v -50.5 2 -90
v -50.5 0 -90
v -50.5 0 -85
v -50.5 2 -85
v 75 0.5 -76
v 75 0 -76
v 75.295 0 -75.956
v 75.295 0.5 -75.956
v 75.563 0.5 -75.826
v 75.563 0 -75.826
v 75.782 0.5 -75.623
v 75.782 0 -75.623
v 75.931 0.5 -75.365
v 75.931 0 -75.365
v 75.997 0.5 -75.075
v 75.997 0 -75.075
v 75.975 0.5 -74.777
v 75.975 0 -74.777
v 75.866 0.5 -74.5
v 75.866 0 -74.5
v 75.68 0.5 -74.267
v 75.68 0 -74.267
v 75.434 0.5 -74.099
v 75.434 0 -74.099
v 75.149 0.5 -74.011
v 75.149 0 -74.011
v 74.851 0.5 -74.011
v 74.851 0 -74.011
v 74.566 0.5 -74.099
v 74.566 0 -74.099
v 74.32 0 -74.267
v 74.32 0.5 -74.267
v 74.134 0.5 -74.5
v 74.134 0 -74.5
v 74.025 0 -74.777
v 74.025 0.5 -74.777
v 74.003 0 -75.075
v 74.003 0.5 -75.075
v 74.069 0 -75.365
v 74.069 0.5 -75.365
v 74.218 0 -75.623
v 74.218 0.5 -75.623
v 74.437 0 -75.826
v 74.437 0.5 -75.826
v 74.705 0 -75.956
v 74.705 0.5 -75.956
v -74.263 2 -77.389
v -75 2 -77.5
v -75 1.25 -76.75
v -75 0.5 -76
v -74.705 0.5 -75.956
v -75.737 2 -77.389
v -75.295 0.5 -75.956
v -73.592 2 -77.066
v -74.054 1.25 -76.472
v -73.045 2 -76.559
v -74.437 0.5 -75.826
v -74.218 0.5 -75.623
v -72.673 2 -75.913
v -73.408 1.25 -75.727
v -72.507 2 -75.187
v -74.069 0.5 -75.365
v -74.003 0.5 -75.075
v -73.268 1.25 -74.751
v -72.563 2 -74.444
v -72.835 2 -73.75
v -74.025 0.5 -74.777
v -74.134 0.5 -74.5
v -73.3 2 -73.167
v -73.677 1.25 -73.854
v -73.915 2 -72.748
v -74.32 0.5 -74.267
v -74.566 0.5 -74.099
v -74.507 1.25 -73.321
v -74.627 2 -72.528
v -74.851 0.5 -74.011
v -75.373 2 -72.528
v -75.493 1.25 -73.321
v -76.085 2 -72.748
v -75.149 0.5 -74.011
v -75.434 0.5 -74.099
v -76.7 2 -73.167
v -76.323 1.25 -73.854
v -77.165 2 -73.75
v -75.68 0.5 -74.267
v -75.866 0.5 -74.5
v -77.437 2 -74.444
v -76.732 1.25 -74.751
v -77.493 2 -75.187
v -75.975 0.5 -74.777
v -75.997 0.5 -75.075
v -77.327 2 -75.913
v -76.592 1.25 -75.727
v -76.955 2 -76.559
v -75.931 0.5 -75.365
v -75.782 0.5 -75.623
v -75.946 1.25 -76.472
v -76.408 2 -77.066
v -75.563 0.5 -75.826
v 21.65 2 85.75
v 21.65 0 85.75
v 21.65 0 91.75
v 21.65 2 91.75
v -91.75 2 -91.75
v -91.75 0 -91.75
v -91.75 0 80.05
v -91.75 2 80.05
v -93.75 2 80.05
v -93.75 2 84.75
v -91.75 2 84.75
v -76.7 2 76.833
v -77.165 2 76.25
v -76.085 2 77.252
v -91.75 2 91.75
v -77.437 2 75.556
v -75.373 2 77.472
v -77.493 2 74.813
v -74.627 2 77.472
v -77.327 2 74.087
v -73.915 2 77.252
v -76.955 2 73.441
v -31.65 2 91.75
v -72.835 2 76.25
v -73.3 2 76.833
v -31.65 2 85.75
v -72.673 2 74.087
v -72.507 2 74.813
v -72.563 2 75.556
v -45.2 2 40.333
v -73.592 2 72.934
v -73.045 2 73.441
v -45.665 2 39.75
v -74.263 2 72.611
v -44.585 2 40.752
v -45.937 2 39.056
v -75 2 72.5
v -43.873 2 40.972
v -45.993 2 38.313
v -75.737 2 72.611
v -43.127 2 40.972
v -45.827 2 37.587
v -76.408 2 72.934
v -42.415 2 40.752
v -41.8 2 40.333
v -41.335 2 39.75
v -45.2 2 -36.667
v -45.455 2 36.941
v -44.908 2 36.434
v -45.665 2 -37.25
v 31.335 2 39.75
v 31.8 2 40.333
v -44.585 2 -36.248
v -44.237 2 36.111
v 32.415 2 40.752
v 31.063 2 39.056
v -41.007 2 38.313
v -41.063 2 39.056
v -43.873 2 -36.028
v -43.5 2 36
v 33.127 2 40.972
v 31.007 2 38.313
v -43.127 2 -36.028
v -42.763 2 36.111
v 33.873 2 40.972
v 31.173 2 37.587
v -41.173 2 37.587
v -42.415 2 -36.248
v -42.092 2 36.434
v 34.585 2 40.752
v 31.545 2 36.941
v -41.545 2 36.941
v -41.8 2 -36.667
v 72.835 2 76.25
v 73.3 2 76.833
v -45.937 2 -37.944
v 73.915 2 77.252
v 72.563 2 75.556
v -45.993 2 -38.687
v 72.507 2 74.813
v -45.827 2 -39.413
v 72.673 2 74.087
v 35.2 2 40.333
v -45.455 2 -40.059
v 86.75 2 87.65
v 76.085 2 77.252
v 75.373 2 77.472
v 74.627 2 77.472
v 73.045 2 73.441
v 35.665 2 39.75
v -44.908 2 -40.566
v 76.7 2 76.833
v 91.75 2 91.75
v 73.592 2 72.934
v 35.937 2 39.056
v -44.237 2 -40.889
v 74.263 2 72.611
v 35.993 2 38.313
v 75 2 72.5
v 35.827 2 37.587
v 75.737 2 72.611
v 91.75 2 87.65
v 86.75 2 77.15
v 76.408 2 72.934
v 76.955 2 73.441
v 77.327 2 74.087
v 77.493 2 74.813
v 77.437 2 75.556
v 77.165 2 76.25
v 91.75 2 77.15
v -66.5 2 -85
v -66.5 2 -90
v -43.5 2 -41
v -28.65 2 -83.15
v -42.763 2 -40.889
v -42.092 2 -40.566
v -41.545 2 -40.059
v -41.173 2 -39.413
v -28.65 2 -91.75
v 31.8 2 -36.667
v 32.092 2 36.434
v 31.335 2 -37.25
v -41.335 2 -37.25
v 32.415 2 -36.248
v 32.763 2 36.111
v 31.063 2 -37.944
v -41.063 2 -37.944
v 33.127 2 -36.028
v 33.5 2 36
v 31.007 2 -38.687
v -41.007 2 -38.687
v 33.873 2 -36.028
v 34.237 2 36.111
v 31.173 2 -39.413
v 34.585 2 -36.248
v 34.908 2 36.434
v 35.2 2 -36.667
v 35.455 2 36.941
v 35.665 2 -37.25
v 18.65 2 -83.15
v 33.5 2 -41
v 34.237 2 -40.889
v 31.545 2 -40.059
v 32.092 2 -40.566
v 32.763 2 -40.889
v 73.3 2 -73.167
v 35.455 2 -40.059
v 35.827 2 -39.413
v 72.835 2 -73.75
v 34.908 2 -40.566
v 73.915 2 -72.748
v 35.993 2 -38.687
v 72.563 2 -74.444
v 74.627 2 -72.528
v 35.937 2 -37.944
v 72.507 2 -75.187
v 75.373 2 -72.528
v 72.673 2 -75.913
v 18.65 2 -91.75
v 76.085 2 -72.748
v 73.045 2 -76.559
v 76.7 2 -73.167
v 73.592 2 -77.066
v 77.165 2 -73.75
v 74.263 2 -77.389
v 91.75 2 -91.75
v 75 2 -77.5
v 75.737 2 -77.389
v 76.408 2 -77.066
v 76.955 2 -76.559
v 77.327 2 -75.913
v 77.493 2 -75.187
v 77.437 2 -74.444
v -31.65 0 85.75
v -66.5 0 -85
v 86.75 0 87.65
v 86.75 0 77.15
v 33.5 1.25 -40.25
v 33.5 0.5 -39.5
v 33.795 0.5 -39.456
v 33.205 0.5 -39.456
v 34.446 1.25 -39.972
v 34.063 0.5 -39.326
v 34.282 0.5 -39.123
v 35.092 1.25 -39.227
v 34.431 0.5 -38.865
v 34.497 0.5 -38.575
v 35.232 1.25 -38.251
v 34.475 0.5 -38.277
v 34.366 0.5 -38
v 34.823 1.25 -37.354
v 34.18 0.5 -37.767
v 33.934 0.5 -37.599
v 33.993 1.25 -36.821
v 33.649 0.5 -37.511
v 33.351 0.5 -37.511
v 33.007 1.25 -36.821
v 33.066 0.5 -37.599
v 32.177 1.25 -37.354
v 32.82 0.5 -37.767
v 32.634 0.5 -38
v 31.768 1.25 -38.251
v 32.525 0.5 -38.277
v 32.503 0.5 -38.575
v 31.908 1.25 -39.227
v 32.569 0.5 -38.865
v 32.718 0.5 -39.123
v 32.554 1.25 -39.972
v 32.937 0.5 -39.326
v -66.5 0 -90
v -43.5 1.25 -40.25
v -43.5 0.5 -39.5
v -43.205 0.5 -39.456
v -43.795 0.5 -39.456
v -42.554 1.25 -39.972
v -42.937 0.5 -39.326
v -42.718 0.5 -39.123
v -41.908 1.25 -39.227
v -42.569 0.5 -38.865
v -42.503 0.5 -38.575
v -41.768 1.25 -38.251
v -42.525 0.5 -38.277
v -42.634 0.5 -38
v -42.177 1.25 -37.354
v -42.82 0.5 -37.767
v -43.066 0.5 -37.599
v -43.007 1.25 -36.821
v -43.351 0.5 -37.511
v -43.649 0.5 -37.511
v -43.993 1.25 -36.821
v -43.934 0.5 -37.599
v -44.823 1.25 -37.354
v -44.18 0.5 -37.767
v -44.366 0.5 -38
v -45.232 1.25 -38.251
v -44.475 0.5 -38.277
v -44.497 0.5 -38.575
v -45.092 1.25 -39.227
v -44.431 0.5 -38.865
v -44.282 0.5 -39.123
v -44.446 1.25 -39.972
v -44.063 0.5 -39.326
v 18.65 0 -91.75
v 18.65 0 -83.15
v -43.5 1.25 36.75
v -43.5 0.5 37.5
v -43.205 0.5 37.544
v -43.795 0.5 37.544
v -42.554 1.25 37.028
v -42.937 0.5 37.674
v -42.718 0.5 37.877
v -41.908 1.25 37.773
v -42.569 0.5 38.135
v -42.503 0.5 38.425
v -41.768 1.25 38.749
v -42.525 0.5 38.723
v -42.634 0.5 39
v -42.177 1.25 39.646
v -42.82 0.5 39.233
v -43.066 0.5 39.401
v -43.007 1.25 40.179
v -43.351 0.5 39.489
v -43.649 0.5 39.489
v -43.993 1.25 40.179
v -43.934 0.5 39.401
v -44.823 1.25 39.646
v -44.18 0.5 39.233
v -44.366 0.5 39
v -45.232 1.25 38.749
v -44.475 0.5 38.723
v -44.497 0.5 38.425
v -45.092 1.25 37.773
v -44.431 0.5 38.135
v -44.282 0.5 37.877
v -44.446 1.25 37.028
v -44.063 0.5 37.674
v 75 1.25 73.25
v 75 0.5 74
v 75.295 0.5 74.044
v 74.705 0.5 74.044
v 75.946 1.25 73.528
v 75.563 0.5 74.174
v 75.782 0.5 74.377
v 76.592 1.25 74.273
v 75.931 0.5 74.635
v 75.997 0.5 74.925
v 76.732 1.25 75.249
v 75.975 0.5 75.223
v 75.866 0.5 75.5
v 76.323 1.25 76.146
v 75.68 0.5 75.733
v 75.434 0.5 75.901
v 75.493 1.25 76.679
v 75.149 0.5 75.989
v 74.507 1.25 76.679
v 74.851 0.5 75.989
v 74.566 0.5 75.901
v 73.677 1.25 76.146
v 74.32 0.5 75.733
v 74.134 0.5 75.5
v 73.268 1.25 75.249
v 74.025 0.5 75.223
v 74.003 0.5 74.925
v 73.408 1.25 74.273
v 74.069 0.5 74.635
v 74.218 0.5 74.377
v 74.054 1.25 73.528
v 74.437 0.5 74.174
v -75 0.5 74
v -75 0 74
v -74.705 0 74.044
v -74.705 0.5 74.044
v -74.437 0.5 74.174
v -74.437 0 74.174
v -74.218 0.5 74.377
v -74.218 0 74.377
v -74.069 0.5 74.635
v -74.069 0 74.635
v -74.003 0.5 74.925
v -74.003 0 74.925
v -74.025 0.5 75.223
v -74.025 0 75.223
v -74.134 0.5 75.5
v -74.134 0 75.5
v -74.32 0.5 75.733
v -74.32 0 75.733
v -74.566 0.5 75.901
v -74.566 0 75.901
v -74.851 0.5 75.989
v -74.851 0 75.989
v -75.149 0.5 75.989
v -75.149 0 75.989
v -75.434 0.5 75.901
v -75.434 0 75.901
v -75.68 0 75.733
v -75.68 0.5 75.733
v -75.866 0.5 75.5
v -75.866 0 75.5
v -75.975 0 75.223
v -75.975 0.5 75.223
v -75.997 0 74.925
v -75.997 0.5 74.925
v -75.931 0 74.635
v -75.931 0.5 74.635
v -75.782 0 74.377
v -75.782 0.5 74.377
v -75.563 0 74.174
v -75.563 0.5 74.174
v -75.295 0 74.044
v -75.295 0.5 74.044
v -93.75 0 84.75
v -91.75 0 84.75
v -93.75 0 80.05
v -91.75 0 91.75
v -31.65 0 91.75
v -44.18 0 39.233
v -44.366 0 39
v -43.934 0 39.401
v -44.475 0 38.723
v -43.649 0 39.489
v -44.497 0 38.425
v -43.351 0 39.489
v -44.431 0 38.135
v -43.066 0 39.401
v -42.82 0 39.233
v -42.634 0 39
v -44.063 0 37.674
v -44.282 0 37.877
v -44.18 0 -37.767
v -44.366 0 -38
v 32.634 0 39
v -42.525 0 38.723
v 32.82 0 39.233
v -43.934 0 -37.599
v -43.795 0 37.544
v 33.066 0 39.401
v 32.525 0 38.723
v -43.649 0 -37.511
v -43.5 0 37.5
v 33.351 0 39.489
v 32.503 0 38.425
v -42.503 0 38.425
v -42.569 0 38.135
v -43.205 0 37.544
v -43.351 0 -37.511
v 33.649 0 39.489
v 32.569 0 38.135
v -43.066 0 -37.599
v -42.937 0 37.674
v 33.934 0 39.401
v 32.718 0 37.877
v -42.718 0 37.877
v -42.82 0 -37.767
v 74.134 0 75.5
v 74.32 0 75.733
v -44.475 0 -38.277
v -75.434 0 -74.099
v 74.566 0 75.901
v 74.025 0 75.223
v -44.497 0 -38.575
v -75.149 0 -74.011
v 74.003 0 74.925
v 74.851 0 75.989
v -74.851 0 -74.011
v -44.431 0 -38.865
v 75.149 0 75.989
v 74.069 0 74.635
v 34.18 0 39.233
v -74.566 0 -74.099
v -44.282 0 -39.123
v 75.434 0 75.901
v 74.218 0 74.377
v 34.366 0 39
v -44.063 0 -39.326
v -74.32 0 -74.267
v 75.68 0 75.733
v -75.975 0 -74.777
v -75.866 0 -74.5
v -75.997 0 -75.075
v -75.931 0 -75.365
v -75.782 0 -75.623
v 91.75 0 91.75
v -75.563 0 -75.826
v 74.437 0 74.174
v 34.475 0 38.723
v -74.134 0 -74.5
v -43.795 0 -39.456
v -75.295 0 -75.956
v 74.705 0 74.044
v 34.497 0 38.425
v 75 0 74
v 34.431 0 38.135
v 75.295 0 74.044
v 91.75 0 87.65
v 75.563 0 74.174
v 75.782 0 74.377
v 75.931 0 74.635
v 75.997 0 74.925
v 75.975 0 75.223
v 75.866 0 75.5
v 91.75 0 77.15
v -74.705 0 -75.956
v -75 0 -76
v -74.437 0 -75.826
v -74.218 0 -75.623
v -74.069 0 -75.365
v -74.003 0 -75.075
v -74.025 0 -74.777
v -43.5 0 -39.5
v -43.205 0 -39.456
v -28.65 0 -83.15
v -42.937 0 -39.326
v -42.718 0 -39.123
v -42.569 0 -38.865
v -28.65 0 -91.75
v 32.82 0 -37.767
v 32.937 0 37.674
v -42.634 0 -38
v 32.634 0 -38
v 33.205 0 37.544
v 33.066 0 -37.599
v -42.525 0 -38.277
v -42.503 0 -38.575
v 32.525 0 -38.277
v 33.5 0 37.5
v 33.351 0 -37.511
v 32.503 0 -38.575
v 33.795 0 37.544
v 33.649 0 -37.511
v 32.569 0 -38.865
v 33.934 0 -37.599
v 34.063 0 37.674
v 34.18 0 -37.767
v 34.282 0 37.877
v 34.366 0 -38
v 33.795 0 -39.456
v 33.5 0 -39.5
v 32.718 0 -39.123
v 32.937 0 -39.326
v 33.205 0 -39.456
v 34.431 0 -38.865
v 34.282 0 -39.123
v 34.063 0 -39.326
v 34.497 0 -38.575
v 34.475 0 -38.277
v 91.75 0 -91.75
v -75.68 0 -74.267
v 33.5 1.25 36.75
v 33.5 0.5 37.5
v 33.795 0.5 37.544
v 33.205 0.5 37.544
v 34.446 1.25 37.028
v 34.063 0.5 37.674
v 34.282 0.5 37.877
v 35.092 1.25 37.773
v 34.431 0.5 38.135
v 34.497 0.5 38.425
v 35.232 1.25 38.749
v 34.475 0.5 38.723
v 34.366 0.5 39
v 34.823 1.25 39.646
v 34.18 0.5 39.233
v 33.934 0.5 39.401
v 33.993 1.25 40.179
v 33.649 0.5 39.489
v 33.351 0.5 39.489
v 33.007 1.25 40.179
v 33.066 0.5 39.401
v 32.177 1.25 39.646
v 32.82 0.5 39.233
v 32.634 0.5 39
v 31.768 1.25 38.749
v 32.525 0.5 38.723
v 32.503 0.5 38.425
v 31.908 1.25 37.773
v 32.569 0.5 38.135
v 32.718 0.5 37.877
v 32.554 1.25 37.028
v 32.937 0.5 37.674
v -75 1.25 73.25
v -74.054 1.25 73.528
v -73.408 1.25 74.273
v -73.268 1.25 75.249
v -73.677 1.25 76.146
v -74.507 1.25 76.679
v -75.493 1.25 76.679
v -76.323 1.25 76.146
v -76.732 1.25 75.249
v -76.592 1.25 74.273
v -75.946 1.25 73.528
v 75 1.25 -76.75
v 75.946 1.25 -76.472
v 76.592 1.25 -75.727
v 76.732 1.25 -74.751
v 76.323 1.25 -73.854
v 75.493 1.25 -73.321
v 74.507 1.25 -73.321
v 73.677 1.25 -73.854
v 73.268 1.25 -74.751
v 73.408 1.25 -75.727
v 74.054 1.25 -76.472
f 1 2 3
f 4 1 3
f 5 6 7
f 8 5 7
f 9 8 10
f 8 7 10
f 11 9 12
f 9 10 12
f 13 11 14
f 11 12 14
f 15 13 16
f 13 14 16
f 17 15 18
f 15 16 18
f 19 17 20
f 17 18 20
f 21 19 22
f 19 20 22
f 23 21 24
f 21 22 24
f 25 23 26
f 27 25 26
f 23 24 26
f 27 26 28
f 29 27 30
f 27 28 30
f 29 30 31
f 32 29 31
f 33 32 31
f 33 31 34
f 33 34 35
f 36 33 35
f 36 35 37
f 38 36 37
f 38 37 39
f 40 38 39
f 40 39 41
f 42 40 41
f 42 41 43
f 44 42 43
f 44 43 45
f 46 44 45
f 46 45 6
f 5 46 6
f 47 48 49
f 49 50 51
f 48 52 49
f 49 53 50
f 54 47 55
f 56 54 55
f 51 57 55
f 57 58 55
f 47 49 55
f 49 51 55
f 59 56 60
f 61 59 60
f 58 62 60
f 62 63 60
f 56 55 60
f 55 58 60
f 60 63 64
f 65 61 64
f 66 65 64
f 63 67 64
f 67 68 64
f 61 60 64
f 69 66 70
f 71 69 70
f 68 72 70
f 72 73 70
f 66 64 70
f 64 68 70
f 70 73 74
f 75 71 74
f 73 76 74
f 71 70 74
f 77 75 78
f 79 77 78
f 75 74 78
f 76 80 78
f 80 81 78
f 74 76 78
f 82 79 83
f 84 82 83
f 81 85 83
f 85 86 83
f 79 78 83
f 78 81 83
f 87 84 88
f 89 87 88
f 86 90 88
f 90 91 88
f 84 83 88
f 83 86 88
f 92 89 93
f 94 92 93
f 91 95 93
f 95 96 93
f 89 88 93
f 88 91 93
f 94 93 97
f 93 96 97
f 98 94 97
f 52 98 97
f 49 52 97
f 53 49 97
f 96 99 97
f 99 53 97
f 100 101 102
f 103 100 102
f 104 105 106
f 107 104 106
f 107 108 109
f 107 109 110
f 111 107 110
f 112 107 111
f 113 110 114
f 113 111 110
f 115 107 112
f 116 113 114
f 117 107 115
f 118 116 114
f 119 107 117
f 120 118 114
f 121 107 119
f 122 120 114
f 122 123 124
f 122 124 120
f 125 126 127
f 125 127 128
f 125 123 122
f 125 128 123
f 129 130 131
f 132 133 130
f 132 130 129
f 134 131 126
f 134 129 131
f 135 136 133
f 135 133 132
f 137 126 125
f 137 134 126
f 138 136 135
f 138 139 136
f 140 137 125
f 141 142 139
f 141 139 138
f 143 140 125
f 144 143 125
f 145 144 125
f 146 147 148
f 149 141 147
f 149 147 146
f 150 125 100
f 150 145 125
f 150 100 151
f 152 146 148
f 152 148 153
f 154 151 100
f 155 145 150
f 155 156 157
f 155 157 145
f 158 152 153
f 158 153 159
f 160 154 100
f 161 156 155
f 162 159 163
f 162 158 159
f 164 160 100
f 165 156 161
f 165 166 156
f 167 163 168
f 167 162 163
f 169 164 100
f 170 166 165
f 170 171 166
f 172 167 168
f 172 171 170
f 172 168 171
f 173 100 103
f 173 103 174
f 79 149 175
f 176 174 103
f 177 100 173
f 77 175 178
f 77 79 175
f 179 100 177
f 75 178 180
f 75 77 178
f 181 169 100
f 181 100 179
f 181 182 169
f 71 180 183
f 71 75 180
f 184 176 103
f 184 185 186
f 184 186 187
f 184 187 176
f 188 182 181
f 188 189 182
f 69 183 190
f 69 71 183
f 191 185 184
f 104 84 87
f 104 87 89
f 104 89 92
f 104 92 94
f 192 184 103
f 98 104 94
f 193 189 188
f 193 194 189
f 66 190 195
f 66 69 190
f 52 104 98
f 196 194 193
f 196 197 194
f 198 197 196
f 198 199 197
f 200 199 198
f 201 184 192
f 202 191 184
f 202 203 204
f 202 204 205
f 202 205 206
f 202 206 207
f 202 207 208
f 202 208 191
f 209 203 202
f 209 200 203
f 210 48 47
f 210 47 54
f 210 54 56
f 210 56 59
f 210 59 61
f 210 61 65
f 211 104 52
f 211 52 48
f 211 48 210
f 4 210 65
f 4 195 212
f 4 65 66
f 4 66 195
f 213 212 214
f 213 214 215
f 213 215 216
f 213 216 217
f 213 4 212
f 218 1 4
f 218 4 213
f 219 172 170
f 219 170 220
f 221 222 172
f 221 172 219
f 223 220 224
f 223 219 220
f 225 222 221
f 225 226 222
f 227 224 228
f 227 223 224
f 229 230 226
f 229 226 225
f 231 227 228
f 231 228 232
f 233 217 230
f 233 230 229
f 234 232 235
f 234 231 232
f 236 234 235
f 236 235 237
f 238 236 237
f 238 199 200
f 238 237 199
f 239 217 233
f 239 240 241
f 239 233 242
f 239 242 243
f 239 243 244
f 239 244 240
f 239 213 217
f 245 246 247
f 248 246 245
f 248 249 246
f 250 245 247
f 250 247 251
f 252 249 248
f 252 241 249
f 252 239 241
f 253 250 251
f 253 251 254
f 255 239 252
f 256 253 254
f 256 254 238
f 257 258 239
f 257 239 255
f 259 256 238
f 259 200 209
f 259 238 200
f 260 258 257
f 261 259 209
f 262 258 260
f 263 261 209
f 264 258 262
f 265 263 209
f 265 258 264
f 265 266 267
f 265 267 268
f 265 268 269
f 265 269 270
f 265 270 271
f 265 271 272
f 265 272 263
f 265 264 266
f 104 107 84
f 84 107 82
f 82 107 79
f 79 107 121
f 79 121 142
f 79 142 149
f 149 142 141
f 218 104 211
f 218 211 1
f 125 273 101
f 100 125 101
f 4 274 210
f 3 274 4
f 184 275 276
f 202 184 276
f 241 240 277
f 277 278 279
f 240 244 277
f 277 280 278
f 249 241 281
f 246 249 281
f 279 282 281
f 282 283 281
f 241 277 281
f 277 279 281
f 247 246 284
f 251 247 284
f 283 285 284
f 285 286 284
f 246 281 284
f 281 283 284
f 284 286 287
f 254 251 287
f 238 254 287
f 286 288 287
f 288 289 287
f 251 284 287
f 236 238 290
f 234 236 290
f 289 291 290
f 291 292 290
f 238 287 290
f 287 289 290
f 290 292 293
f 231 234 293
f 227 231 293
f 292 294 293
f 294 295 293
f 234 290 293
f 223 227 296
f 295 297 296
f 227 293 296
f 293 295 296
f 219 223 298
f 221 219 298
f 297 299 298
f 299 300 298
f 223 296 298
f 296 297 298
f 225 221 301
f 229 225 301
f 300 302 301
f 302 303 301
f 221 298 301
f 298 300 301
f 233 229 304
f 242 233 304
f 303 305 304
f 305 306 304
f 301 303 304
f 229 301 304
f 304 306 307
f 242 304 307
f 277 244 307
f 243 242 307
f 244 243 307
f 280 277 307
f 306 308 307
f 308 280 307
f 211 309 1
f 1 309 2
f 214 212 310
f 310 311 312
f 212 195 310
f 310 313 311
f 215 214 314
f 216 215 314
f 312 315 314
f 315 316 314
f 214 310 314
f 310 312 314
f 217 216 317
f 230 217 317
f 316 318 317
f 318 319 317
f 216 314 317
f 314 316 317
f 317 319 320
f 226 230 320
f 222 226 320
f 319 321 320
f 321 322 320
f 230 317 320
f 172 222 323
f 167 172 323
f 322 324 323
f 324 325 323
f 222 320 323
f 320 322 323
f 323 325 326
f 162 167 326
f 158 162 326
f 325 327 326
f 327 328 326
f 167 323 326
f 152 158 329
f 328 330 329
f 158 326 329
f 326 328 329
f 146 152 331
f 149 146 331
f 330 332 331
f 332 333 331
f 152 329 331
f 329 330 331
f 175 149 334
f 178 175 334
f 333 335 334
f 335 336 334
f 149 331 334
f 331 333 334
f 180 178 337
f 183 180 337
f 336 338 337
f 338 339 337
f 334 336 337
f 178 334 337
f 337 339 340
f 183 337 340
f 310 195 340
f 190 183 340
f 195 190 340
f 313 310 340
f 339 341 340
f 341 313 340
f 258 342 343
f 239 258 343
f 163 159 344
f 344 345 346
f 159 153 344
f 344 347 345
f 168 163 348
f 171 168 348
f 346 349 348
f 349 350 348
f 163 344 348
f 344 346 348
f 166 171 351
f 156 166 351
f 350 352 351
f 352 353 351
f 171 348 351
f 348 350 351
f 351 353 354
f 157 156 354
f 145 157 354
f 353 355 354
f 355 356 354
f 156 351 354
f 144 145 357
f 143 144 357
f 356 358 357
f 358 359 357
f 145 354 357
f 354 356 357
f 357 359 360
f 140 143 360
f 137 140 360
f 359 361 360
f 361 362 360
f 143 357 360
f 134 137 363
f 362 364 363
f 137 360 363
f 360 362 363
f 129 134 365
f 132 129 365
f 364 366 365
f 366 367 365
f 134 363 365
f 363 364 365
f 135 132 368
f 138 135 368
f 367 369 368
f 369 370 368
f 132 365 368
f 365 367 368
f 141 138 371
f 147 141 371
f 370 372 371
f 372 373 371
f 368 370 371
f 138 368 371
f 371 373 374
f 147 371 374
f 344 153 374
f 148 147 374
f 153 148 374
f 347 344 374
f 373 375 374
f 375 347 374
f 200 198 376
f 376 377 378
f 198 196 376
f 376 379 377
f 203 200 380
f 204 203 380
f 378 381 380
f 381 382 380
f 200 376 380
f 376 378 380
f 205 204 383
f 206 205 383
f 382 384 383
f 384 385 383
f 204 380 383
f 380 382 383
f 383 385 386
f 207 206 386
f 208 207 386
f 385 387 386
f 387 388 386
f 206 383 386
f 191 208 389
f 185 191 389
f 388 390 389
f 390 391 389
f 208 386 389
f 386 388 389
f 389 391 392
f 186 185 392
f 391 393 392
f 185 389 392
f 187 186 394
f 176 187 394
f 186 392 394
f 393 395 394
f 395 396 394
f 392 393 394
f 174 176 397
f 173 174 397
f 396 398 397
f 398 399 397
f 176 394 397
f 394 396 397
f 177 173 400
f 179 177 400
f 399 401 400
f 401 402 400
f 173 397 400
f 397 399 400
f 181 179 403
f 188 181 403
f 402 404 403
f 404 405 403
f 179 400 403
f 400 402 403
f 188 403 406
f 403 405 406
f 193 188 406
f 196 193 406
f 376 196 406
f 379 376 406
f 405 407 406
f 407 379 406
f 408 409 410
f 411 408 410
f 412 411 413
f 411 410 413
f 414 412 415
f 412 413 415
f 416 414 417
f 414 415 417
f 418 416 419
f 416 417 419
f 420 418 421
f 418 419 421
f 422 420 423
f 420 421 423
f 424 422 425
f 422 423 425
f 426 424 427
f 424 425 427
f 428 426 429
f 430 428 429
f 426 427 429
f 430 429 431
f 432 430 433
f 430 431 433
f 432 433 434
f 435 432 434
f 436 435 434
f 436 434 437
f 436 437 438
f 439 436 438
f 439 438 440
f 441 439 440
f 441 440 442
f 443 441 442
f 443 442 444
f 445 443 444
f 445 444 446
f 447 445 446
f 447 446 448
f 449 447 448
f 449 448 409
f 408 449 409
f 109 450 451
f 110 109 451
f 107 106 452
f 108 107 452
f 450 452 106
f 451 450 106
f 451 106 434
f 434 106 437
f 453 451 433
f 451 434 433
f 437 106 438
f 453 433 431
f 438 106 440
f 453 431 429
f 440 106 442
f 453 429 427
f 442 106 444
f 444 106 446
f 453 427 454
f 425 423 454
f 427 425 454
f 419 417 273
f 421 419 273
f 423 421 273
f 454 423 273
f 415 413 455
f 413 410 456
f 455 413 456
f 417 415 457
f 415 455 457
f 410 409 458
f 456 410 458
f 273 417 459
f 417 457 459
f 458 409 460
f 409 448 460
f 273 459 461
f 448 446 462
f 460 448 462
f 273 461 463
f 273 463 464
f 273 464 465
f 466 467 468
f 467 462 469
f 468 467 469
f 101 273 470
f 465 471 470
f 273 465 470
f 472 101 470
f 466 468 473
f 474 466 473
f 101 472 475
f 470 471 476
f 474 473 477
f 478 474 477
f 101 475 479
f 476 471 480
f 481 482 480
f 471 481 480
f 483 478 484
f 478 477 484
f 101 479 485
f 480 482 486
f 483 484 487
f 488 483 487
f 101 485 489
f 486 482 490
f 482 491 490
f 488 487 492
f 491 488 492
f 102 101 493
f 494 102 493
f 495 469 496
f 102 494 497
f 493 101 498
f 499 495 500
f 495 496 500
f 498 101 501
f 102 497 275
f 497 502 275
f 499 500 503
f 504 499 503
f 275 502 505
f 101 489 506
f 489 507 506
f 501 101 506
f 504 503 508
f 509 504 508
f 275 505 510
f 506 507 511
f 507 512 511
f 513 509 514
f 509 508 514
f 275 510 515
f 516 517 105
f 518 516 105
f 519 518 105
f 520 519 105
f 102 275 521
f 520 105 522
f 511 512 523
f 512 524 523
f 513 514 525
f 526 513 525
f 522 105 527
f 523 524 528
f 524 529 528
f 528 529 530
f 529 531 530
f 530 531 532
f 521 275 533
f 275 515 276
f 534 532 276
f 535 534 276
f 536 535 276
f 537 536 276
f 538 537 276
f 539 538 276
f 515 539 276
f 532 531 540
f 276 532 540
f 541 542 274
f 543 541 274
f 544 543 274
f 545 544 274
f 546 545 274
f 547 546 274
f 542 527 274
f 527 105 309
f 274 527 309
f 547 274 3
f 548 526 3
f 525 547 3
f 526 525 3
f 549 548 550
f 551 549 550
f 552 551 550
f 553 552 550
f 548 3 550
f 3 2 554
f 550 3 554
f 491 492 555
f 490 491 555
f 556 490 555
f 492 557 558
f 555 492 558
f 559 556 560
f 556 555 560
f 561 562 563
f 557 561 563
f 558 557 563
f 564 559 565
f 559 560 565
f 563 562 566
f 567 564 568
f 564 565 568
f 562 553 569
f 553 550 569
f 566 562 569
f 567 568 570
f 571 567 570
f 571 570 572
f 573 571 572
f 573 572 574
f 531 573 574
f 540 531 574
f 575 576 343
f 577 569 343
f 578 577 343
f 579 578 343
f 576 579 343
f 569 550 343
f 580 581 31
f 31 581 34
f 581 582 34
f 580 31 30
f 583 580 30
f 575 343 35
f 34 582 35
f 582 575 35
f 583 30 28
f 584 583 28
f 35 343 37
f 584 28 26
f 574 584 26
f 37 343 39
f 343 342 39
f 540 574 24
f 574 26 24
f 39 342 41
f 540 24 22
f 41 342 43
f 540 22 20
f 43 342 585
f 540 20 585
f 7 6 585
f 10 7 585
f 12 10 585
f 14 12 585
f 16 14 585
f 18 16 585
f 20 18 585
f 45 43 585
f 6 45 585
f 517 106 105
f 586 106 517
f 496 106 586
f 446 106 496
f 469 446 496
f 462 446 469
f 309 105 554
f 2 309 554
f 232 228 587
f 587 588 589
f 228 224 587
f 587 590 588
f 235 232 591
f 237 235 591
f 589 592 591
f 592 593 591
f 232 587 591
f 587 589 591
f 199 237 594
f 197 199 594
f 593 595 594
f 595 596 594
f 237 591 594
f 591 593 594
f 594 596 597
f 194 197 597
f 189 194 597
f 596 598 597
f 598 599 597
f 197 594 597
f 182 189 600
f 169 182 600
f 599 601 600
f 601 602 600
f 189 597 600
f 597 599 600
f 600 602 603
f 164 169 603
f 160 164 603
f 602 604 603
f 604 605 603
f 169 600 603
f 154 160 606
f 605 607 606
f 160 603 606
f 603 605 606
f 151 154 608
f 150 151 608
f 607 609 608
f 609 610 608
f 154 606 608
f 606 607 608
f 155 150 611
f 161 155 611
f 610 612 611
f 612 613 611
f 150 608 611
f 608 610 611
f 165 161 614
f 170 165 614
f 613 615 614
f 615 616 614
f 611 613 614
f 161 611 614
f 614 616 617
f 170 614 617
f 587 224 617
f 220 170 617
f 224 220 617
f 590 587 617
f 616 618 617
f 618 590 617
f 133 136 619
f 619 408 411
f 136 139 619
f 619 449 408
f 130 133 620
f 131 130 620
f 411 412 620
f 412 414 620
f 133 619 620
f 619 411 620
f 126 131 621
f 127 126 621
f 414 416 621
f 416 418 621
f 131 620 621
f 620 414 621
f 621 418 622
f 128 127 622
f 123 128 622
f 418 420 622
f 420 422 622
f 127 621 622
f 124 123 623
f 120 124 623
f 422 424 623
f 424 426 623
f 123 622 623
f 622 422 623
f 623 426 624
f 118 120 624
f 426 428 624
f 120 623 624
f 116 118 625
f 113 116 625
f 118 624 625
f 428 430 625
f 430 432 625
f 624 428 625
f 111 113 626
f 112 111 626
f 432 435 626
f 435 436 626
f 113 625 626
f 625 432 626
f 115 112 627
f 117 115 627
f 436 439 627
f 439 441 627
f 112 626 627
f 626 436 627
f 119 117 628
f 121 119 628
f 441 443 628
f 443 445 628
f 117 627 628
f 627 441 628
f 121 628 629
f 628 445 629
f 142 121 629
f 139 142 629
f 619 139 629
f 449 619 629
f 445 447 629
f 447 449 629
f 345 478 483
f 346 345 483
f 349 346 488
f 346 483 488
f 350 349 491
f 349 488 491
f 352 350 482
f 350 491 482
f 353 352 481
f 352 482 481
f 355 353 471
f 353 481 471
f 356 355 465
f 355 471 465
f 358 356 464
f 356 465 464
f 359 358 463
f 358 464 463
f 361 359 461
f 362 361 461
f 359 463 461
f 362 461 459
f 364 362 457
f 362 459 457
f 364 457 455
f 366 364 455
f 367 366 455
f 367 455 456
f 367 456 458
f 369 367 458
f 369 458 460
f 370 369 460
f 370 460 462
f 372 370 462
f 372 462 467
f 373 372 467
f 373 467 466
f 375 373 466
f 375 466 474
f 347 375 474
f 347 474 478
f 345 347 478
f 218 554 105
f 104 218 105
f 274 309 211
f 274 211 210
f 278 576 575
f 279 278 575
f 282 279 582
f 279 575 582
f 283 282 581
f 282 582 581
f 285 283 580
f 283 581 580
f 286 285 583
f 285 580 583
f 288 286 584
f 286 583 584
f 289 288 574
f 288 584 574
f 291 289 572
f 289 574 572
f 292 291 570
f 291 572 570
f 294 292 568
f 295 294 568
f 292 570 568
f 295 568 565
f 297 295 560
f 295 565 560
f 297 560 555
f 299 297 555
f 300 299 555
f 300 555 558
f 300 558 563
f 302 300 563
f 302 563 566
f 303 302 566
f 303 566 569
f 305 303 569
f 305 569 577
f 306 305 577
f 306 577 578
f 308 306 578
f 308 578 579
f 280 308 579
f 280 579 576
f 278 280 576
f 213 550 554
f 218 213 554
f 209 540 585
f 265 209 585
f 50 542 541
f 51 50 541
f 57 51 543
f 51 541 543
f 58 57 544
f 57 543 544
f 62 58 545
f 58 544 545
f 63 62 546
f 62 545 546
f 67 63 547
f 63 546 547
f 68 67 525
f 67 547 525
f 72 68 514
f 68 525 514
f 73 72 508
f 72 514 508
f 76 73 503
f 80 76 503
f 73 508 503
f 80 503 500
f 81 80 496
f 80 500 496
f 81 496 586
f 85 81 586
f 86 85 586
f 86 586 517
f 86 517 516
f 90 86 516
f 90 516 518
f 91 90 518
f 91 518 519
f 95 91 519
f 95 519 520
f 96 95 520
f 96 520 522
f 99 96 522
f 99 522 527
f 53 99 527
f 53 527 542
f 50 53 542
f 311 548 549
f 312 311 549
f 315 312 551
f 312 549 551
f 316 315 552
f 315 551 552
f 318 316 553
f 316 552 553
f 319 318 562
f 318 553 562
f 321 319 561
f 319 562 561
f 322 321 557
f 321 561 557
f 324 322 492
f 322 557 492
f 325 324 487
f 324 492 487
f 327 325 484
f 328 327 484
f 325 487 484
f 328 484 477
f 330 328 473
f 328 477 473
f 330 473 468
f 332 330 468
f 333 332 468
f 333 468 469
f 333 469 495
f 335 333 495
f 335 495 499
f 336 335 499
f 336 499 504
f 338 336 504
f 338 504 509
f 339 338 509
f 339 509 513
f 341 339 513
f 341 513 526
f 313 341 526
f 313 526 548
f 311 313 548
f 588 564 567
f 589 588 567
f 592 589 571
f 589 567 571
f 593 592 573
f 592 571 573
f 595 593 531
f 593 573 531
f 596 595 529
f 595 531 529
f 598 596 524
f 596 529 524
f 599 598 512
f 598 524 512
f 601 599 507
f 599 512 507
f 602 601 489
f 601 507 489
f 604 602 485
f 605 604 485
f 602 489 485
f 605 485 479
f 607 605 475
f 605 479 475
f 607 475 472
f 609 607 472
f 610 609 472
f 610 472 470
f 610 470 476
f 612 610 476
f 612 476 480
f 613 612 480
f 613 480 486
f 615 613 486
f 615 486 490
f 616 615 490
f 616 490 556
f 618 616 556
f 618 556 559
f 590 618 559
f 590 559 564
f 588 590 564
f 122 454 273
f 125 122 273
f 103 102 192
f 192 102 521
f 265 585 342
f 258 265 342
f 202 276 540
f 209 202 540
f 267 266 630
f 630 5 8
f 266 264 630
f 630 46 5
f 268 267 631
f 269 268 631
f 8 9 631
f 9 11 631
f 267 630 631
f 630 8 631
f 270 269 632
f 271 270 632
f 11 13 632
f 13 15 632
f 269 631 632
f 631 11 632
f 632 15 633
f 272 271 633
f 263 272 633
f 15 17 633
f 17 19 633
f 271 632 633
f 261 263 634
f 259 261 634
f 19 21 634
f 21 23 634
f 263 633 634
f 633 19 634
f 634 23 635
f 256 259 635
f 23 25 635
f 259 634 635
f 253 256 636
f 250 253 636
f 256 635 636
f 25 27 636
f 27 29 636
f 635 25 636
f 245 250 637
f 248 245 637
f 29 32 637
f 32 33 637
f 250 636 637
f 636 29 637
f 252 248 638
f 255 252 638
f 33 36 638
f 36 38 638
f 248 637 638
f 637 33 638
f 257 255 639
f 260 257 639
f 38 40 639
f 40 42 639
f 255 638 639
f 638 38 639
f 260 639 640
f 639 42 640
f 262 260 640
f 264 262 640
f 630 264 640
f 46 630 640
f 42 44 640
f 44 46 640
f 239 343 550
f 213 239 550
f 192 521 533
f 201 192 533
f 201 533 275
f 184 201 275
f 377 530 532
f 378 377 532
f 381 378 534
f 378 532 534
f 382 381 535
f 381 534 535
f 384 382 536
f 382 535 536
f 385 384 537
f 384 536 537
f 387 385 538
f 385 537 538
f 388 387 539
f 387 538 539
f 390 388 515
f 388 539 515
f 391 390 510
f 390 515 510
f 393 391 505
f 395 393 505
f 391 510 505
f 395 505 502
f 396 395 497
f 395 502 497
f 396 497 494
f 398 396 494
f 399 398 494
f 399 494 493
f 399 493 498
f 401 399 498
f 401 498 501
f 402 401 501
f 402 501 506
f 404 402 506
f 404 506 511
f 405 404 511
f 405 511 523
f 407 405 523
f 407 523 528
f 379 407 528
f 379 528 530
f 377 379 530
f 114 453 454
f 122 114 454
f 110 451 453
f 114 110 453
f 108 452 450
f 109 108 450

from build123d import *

# Parameters (mm, degrees)
BOSS_EXTRUDE1_DEPTH = 2
SKETCH2_R           = 1
CUT_EXTRUDE1_DEPTH  = 132.191177295
CHAMFER1_SIZE       = 1.5
SKETCH3_W           = 16
SKETCH3_H           = 5
CUT_EXTRUDE2_DEPTH  = 132.191177295


with BuildPart() as part:
    # Sketch1 → Boss-Extrude1 (new body)
    with BuildSketch(Plane(origin=(0, 0, 0), x_dir=(1, 0, 0), z_dir=(0, 1, 0))):
        Polygon((-91.75, 91.75), (-91.75, -80.05), (-93.75, -80.05), (-93.75, -84.75), (-91.75, -84.75), (-91.75, -91.75), (-31.65, -91.75), (-31.65, -85.75), (21.65, -85.75), (21.65, -91.75), (91.75, -91.75), (91.75, -87.65), (86.75, -87.65), (86.75, -77.15), (91.75, -77.15), (91.75, 91.75), (18.65, 91.75), (18.65, 83.15), (-28.65, 83.15), (-28.65, 91.75), align=None)
    extrude(amount=BOSS_EXTRUDE1_DEPTH)

    # Sketch2 → Cut-Extrude1 (cut, through all)
    with BuildSketch(Plane.XZ):
        with Locations(Location((75, -75, 0), (0, 0, 270))):
            Circle(SKETCH2_R)
        with Locations(Location((-75, -75, 0), (0, 0, 270))):
            Circle(SKETCH2_R)
        with Locations(Location((-75, 75, 0), (0, 0, 270))):
            Circle(SKETCH2_R)
        with Locations(Location((75, 75, 0), (0, 0, 270))):
            Circle(SKETCH2_R)
        with Locations(Location((33.5, -38.5, 0), (0, 0, 270))):
            Circle(SKETCH2_R)
        with Locations(Location((33.5, 38.5, 0), (0, 0, 270))):
            Circle(SKETCH2_R)
        with Locations(Location((-43.5, -38.5, 0), (0, 0, 270))):
            Circle(SKETCH2_R)
        with Locations(Location((-43.5, 38.5, 0), (0, 0, 270))):
            Circle(SKETCH2_R)
    extrude(amount=-CUT_EXTRUDE1_DEPTH, mode=Mode.SUBTRACT)

    # Chamfer1
    chamfer1_edges = [part.edges().sort_by_distance(p)[0] for p in [
        (-75, 2, -74),
        (-75, 2, 76),
        (75, 2, 76),
        (33.5, 2, -37.5),
        (-43.5, 2, 39.5),
        (-43.5, 2, -37.5),
        (33.5, 2, 39.5),
        (75, 2, -74),
    ]]
    chamfer(chamfer1_edges, length=CHAMFER1_SIZE)

    # Sketch3 → Cut-Extrude2 (cut, through all)
    with BuildSketch(Plane.XZ):
        with Locations((-58.5, -87.5)):
            Rectangle(SKETCH3_W, SKETCH3_H)
    extrude(amount=-CUT_EXTRUDE2_DEPTH, mode=Mode.SUBTRACT)


solid = part.part
